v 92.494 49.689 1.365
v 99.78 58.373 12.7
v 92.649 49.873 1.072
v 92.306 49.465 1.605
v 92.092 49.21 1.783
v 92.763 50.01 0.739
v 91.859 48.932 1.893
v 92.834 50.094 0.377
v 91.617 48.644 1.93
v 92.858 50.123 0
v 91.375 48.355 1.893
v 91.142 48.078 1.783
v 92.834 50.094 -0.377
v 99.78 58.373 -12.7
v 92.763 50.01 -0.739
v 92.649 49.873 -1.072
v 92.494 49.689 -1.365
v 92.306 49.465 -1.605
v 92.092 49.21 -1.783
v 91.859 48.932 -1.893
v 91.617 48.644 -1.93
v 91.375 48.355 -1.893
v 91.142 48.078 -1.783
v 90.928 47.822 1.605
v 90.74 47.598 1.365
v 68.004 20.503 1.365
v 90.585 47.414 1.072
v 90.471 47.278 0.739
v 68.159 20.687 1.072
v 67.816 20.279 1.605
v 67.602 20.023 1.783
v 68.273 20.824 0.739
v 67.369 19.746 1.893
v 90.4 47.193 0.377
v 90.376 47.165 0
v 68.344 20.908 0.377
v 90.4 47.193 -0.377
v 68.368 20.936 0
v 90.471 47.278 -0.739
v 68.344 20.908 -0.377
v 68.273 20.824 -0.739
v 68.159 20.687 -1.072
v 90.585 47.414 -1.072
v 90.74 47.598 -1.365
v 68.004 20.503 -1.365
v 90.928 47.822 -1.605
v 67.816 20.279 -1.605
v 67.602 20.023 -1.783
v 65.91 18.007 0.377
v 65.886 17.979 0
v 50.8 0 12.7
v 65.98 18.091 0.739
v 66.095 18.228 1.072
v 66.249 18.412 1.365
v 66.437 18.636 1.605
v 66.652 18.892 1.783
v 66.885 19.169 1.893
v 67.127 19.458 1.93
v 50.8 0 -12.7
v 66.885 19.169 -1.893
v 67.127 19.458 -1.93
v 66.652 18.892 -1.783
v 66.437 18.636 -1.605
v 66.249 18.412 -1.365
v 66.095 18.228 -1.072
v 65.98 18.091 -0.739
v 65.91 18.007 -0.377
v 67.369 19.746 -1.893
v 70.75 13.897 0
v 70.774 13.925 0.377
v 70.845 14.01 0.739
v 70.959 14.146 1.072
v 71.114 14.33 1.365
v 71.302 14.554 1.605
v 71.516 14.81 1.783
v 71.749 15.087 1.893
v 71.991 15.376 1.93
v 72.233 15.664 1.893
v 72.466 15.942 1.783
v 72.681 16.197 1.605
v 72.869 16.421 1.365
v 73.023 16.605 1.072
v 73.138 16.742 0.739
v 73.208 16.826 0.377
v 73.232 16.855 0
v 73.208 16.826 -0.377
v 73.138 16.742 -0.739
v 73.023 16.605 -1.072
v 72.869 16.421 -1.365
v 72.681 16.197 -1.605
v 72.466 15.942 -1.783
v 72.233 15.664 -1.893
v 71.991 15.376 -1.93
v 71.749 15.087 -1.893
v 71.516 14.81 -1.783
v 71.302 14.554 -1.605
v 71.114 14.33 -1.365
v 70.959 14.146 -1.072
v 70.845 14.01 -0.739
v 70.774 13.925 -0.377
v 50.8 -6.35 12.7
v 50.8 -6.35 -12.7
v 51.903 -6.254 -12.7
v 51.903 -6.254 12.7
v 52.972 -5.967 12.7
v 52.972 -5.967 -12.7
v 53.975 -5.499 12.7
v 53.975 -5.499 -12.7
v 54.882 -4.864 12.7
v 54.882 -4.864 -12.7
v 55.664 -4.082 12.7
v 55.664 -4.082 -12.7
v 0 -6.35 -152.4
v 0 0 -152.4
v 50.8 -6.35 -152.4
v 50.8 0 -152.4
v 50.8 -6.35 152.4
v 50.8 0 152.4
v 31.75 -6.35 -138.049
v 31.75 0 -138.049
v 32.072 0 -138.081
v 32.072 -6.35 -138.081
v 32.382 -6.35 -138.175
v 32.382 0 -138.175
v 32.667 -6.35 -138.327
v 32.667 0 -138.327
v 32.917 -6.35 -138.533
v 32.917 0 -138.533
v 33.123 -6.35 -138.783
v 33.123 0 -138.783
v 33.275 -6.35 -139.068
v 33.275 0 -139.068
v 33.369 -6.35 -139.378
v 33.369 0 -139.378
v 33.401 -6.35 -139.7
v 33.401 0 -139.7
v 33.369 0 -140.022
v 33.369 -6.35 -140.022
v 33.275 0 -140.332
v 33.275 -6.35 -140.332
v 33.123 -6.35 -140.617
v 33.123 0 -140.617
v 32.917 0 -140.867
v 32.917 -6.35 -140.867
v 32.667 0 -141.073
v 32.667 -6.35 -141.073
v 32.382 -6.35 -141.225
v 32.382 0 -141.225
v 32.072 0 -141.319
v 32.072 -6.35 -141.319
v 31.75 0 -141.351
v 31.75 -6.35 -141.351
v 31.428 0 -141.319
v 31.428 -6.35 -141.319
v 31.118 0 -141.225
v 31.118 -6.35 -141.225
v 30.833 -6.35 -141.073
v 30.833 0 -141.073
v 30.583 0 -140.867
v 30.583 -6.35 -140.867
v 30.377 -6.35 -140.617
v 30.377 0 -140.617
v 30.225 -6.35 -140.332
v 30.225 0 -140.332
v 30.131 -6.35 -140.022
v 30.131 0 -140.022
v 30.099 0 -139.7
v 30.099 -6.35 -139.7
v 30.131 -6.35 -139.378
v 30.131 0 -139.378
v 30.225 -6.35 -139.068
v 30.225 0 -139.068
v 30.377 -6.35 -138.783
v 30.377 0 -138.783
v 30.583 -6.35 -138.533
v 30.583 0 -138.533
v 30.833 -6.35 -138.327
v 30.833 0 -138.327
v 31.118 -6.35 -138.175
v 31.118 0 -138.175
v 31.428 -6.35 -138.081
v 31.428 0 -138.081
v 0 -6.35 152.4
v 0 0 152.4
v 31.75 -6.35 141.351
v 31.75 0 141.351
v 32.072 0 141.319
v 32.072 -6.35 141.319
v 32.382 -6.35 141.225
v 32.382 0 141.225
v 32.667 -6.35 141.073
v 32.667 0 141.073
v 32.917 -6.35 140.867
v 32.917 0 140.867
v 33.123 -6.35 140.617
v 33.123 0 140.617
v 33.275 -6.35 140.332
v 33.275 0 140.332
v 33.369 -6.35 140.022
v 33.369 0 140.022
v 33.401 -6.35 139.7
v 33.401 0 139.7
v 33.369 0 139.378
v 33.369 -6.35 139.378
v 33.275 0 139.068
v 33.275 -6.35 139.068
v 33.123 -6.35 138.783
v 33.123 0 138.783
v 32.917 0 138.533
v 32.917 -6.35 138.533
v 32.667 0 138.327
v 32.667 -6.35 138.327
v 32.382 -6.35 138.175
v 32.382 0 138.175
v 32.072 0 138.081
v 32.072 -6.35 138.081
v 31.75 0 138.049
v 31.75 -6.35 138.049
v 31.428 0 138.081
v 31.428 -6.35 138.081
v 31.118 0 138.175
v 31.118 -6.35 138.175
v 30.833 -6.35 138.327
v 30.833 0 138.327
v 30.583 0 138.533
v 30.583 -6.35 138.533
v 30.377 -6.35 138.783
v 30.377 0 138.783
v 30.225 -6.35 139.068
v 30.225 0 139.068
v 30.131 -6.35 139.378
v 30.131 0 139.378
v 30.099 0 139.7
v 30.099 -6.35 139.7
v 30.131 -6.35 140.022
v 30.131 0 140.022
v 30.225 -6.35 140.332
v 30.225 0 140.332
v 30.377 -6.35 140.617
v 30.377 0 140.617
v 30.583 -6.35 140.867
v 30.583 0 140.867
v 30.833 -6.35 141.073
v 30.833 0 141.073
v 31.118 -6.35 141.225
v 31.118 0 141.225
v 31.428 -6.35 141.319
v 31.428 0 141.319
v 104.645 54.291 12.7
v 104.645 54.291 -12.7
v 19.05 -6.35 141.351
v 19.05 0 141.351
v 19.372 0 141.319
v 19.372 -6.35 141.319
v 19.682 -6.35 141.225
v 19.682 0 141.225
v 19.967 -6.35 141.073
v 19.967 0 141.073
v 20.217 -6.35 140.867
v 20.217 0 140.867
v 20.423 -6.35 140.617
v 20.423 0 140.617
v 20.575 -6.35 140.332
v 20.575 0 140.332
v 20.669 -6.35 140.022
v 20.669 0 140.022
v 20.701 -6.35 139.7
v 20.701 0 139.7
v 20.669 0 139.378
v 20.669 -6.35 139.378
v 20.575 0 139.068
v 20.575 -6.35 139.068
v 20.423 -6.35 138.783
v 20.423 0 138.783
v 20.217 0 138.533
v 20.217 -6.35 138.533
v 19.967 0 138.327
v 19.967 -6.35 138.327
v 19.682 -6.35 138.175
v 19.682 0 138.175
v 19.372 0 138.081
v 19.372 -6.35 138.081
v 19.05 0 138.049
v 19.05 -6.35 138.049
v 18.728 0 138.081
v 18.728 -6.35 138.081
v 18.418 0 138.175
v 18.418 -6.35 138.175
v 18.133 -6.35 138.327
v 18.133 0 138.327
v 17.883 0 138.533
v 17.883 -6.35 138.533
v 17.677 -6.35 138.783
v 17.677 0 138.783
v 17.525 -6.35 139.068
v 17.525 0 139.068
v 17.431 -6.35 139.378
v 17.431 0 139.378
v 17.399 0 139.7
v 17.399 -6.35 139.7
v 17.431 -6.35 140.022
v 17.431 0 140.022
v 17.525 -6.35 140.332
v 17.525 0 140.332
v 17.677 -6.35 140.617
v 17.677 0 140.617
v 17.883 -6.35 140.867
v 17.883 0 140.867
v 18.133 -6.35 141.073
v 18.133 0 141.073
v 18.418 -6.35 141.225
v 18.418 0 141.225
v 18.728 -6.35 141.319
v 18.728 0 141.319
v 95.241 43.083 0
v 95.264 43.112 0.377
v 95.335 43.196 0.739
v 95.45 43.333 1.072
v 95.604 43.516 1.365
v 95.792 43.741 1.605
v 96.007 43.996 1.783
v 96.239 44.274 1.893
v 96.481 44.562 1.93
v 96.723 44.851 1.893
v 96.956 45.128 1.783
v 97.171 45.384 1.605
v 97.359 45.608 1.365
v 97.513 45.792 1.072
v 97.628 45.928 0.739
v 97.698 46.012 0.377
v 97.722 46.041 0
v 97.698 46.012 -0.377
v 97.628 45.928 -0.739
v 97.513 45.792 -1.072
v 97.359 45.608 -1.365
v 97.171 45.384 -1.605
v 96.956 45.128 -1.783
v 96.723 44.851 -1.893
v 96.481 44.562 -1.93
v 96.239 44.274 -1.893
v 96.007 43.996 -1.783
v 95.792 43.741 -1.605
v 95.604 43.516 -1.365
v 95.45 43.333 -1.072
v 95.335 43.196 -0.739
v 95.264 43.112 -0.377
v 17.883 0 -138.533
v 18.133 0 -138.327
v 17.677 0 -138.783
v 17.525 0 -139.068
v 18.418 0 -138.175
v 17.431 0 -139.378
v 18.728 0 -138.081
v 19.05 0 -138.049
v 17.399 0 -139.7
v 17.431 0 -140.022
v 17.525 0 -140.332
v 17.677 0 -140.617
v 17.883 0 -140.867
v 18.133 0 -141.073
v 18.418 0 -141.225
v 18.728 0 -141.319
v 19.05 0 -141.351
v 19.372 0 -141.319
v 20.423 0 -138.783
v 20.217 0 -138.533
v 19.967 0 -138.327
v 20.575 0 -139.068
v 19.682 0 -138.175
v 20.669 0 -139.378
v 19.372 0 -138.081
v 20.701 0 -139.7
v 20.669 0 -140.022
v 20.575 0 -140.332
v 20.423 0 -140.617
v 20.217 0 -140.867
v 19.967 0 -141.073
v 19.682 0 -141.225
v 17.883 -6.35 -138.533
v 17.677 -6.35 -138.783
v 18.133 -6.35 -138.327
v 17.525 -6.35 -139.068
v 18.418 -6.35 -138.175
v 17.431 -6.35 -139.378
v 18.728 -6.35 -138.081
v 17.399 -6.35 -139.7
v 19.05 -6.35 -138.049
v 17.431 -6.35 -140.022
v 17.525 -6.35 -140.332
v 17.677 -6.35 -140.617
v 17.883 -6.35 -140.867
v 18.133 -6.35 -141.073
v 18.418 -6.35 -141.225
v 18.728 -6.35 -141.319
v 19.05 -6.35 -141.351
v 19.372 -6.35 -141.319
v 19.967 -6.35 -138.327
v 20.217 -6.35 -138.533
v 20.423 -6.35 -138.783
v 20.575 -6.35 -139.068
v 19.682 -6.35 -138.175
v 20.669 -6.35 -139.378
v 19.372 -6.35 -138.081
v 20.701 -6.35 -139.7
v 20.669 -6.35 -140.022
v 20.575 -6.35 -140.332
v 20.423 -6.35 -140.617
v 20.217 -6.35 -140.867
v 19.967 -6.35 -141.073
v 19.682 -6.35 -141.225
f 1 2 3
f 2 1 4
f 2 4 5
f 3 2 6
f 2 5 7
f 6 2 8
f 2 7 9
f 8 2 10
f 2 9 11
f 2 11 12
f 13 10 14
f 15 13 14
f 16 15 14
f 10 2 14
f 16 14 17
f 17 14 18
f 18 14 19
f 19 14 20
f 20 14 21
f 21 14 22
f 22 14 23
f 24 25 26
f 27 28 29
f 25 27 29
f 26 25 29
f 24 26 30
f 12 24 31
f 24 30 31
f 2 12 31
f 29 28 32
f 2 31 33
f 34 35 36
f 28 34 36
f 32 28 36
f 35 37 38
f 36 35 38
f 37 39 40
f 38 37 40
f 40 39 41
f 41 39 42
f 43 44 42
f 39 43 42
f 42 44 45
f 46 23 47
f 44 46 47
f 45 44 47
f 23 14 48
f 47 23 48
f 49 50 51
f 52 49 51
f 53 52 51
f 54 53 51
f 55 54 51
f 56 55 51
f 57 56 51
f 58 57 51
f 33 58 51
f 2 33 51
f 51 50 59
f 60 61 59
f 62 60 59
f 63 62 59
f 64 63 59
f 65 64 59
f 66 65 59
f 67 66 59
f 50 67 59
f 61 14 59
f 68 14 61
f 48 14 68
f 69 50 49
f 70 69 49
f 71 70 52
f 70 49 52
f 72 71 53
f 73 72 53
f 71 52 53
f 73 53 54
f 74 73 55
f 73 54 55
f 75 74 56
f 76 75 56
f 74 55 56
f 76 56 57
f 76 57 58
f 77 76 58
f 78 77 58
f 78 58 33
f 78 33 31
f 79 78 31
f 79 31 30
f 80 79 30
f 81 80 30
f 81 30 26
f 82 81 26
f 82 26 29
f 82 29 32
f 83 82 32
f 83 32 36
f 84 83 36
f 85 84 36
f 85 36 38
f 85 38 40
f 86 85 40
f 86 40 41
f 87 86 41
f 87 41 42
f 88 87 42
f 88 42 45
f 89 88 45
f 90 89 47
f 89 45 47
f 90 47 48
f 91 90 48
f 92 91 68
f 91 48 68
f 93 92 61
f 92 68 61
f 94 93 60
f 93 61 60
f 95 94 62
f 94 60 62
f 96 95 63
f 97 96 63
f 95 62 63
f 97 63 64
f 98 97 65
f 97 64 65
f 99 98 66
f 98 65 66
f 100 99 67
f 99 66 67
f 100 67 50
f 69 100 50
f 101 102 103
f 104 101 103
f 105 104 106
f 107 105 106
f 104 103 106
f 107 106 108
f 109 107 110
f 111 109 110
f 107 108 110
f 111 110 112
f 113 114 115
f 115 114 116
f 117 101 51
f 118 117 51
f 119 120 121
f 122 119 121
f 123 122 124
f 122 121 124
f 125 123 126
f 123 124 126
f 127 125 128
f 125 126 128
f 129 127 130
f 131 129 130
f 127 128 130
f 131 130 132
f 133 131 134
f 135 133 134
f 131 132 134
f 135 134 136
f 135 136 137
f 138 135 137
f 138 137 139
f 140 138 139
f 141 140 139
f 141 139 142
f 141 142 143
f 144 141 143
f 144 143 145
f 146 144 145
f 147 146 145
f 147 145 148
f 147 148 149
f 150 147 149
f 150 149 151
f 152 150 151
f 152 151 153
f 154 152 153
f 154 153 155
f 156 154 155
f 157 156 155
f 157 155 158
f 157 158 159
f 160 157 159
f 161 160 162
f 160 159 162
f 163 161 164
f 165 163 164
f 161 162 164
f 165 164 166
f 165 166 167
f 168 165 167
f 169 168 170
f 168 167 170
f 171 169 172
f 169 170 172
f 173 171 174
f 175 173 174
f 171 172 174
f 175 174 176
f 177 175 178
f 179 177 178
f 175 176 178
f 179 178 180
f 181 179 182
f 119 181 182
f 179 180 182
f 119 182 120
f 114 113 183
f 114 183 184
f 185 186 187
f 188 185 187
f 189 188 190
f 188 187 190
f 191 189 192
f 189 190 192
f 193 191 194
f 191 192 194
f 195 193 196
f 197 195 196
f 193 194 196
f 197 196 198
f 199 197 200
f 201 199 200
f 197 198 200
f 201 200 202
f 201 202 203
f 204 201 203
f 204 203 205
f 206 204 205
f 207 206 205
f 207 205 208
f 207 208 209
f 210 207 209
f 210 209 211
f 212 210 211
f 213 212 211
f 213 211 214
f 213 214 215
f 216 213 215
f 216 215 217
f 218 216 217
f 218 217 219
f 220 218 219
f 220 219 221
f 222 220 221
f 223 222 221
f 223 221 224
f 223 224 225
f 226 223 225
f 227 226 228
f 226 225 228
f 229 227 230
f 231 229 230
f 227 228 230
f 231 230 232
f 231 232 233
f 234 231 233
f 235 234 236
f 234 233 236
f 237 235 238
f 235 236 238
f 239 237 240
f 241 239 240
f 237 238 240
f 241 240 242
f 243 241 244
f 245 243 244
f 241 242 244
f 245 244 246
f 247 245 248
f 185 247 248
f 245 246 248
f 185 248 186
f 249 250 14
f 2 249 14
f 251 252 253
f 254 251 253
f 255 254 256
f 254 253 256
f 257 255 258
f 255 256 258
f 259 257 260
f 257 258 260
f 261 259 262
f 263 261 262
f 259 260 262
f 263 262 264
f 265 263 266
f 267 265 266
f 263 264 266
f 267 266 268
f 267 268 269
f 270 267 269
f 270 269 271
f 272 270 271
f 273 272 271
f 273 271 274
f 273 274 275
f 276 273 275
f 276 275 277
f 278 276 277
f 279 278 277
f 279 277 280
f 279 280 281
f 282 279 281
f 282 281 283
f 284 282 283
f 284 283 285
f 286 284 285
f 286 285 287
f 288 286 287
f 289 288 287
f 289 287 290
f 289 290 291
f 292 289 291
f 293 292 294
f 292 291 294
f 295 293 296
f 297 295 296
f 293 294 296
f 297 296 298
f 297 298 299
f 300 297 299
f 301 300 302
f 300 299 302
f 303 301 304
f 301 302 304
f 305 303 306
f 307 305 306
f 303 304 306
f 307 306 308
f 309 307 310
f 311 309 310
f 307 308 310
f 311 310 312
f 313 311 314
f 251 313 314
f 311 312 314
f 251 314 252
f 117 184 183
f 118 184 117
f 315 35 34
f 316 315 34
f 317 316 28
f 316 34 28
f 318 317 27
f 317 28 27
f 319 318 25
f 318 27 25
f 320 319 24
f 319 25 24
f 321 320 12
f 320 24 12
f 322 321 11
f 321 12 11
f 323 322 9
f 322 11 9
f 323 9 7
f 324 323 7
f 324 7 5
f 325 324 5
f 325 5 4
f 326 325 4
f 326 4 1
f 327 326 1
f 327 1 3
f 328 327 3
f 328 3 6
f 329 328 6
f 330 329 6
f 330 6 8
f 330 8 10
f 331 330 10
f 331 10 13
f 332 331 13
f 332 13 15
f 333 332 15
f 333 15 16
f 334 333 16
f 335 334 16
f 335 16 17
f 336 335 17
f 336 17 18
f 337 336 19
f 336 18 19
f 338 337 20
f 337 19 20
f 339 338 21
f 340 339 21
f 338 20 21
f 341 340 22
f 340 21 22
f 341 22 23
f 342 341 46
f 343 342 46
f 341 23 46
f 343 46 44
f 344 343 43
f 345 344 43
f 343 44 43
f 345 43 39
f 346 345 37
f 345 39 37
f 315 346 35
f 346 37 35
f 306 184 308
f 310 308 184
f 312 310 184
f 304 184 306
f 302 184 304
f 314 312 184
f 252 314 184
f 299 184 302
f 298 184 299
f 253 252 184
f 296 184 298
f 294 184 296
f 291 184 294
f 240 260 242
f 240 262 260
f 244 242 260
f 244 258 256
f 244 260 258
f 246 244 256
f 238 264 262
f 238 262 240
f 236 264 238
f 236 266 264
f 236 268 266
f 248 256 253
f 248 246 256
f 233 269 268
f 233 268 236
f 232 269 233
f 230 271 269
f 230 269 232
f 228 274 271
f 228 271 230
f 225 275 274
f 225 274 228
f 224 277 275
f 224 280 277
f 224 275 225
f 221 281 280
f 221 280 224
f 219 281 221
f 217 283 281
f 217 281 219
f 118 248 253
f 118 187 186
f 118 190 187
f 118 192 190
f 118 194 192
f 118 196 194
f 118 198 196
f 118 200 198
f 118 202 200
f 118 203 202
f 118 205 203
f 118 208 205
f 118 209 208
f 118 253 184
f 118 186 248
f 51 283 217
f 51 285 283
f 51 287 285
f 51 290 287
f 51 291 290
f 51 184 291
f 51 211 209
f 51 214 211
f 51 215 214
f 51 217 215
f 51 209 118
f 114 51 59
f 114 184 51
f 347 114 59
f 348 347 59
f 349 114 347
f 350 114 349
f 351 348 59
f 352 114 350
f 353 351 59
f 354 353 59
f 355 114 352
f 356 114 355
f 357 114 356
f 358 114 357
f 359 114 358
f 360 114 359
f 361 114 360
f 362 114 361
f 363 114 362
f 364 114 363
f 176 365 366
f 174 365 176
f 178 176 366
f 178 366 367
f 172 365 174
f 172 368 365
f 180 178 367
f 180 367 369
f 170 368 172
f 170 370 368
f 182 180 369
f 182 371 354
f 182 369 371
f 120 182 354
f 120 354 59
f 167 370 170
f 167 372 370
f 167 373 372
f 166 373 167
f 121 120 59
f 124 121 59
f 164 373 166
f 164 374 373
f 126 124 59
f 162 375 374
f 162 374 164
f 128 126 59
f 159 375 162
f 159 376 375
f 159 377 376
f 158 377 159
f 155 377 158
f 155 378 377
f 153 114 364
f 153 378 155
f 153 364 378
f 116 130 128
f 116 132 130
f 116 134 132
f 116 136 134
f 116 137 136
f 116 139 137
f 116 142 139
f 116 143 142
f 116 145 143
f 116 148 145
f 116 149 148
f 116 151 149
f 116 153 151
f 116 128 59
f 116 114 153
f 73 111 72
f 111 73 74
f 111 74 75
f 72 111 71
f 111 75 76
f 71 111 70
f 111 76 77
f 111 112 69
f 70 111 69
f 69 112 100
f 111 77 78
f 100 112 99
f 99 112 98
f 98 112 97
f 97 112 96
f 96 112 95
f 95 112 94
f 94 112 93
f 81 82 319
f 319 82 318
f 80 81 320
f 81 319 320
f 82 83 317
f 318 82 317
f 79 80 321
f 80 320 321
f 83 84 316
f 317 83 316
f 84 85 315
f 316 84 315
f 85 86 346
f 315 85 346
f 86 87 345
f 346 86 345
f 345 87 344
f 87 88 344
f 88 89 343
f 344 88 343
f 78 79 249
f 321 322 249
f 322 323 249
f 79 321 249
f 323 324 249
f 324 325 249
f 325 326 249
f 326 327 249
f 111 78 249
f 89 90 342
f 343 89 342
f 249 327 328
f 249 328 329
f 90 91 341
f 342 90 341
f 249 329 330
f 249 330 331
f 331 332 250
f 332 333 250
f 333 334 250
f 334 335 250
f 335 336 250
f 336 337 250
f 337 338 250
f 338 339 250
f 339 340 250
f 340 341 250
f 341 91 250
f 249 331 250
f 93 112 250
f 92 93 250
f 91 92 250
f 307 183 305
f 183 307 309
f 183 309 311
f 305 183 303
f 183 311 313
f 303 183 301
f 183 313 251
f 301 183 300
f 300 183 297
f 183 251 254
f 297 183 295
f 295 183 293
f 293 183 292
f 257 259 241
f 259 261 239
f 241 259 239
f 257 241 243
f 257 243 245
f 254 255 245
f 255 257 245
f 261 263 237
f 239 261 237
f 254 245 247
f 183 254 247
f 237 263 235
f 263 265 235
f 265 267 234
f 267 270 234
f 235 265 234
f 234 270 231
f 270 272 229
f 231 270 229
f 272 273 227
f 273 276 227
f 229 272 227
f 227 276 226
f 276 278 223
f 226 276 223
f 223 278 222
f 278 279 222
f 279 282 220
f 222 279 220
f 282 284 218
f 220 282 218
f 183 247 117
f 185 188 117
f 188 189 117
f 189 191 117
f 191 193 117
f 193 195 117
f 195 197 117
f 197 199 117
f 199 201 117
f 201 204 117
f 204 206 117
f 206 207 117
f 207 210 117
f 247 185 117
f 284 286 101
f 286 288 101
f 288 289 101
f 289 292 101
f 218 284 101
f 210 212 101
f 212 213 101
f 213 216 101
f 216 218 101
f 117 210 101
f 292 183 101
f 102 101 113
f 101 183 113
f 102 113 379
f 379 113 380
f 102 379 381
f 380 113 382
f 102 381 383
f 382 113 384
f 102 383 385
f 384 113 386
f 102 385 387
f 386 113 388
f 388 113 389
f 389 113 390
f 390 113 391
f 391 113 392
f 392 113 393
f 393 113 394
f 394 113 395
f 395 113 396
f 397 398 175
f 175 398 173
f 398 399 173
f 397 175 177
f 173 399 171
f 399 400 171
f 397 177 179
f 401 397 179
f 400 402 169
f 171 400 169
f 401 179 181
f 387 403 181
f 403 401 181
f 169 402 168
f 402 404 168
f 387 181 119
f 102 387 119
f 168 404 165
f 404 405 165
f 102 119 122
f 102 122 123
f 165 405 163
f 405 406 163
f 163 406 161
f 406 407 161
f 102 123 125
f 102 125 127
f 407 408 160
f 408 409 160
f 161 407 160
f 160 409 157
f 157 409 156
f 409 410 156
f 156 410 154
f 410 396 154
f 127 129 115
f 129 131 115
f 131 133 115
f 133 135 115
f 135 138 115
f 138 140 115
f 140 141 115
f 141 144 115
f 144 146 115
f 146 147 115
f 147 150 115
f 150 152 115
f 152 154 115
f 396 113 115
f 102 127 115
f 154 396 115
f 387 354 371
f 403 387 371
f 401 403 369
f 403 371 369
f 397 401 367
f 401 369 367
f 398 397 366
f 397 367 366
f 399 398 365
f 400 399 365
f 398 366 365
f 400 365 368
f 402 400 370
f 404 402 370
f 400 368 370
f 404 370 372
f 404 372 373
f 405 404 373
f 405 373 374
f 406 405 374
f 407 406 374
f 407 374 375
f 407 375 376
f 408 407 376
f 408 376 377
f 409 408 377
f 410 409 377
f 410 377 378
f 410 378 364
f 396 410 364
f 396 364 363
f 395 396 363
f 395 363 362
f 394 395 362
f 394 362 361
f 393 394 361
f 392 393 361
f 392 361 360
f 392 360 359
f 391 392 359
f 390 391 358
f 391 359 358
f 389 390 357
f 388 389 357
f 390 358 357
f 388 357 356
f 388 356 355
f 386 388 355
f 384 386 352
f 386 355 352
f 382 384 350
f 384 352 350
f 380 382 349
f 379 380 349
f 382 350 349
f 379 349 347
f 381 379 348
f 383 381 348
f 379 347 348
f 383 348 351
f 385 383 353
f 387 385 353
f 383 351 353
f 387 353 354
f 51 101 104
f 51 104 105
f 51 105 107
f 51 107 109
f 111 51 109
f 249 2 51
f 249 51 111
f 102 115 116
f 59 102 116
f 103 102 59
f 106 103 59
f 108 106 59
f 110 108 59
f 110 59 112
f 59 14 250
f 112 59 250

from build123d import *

# Parameters (mm, degrees)
BOSS_EXTRUDE1_START = -152.4
SKETCH1_W           = 50.8
SKETCH1_H           = 6.35
BOSS_EXTRUDE1_DEPTH = 304.8
BOSS_EXTRUDE2_START = -12.7
BOSS_EXTRUDE2_DEPTH = 25.4
SKETCH2_R           = 1.651
CUT_EXTRUDE2_DEPTH  = 25.4
SKETCH3_R           = 1.9304
CUT_EXTRUDE4_DEPTH  = 25.4


with BuildPart() as part:
    # Sketch1 → Boss-Extrude1 (new body)
    with BuildSketch(Plane.XY.offset(BOSS_EXTRUDE1_START)):
        with Locations((25.4, -3.175)):
            Rectangle(SKETCH1_W, SKETCH1_H)
    extrude(amount=BOSS_EXTRUDE1_DEPTH)

    # Sketch1<7> → Boss-Extrude2 (add)
    with BuildSketch(Plane.XY.offset(BOSS_EXTRUDE2_START)):
        with BuildLine():
            ThreePointArc((50.8, -6.35), (53.483625962, -5.755054448), (55.664382214, -4.081701322))
            Line((55.664382214, -4.081701322), (104.644798072, 54.290885244))
            Line((104.644798072, 54.290885244), (99.780415858, 58.372586566))
            Line((99.780415858, 58.372586566), (50.8, 0))
            Line((50.8, 0), (50.8, -6.35))
        make_face()
    extrude(amount=BOSS_EXTRUDE2_DEPTH)

    # Sketch2 → Cut-Extrude2 (cut)
    with BuildSketch(Plane(origin=(0, 0, 0), x_dir=(1, 0, 0), z_dir=(0, 1, 0))):
        with Locations(Location((19.05, -139.7, 0), (0, 0, 270))):
            Circle(SKETCH2_R)
        with Locations(Location((31.75, -139.7, 0), (0, 0, 270))):
            Circle(SKETCH2_R)
        with Locations(Location((31.75, 139.7, 0), (0, 0, 270))):
            Circle(SKETCH2_R)
        with Locations(Location((19.05, 139.7, 0), (0, 0, 270))):
            Circle(SKETCH2_R)
    extrude(amount=-CUT_EXTRUDE2_DEPTH, mode=Mode.SUBTRACT)

    # Sketch3 → Cut-Extrude4 (cut)
    with BuildSketch(Plane(origin=(29.810663713, -25.014116927, 0), x_dir=(0.6427876096865373, 0.7660444431189797, 0), z_dir=(-0.7660444431189798, 0.6427876096865374, 0))):
        with Locations(Location((96.153610572, 0, 0), (0, 0, 180))):
            Circle(SKETCH3_R)
        with Locations(Location((58.053610572, 0, 0), (0, 0, 180))):
            Circle(SKETCH3_R)
    extrude(amount=-CUT_EXTRUDE4_DEPTH, mode=Mode.SUBTRACT)


solid = part.part
